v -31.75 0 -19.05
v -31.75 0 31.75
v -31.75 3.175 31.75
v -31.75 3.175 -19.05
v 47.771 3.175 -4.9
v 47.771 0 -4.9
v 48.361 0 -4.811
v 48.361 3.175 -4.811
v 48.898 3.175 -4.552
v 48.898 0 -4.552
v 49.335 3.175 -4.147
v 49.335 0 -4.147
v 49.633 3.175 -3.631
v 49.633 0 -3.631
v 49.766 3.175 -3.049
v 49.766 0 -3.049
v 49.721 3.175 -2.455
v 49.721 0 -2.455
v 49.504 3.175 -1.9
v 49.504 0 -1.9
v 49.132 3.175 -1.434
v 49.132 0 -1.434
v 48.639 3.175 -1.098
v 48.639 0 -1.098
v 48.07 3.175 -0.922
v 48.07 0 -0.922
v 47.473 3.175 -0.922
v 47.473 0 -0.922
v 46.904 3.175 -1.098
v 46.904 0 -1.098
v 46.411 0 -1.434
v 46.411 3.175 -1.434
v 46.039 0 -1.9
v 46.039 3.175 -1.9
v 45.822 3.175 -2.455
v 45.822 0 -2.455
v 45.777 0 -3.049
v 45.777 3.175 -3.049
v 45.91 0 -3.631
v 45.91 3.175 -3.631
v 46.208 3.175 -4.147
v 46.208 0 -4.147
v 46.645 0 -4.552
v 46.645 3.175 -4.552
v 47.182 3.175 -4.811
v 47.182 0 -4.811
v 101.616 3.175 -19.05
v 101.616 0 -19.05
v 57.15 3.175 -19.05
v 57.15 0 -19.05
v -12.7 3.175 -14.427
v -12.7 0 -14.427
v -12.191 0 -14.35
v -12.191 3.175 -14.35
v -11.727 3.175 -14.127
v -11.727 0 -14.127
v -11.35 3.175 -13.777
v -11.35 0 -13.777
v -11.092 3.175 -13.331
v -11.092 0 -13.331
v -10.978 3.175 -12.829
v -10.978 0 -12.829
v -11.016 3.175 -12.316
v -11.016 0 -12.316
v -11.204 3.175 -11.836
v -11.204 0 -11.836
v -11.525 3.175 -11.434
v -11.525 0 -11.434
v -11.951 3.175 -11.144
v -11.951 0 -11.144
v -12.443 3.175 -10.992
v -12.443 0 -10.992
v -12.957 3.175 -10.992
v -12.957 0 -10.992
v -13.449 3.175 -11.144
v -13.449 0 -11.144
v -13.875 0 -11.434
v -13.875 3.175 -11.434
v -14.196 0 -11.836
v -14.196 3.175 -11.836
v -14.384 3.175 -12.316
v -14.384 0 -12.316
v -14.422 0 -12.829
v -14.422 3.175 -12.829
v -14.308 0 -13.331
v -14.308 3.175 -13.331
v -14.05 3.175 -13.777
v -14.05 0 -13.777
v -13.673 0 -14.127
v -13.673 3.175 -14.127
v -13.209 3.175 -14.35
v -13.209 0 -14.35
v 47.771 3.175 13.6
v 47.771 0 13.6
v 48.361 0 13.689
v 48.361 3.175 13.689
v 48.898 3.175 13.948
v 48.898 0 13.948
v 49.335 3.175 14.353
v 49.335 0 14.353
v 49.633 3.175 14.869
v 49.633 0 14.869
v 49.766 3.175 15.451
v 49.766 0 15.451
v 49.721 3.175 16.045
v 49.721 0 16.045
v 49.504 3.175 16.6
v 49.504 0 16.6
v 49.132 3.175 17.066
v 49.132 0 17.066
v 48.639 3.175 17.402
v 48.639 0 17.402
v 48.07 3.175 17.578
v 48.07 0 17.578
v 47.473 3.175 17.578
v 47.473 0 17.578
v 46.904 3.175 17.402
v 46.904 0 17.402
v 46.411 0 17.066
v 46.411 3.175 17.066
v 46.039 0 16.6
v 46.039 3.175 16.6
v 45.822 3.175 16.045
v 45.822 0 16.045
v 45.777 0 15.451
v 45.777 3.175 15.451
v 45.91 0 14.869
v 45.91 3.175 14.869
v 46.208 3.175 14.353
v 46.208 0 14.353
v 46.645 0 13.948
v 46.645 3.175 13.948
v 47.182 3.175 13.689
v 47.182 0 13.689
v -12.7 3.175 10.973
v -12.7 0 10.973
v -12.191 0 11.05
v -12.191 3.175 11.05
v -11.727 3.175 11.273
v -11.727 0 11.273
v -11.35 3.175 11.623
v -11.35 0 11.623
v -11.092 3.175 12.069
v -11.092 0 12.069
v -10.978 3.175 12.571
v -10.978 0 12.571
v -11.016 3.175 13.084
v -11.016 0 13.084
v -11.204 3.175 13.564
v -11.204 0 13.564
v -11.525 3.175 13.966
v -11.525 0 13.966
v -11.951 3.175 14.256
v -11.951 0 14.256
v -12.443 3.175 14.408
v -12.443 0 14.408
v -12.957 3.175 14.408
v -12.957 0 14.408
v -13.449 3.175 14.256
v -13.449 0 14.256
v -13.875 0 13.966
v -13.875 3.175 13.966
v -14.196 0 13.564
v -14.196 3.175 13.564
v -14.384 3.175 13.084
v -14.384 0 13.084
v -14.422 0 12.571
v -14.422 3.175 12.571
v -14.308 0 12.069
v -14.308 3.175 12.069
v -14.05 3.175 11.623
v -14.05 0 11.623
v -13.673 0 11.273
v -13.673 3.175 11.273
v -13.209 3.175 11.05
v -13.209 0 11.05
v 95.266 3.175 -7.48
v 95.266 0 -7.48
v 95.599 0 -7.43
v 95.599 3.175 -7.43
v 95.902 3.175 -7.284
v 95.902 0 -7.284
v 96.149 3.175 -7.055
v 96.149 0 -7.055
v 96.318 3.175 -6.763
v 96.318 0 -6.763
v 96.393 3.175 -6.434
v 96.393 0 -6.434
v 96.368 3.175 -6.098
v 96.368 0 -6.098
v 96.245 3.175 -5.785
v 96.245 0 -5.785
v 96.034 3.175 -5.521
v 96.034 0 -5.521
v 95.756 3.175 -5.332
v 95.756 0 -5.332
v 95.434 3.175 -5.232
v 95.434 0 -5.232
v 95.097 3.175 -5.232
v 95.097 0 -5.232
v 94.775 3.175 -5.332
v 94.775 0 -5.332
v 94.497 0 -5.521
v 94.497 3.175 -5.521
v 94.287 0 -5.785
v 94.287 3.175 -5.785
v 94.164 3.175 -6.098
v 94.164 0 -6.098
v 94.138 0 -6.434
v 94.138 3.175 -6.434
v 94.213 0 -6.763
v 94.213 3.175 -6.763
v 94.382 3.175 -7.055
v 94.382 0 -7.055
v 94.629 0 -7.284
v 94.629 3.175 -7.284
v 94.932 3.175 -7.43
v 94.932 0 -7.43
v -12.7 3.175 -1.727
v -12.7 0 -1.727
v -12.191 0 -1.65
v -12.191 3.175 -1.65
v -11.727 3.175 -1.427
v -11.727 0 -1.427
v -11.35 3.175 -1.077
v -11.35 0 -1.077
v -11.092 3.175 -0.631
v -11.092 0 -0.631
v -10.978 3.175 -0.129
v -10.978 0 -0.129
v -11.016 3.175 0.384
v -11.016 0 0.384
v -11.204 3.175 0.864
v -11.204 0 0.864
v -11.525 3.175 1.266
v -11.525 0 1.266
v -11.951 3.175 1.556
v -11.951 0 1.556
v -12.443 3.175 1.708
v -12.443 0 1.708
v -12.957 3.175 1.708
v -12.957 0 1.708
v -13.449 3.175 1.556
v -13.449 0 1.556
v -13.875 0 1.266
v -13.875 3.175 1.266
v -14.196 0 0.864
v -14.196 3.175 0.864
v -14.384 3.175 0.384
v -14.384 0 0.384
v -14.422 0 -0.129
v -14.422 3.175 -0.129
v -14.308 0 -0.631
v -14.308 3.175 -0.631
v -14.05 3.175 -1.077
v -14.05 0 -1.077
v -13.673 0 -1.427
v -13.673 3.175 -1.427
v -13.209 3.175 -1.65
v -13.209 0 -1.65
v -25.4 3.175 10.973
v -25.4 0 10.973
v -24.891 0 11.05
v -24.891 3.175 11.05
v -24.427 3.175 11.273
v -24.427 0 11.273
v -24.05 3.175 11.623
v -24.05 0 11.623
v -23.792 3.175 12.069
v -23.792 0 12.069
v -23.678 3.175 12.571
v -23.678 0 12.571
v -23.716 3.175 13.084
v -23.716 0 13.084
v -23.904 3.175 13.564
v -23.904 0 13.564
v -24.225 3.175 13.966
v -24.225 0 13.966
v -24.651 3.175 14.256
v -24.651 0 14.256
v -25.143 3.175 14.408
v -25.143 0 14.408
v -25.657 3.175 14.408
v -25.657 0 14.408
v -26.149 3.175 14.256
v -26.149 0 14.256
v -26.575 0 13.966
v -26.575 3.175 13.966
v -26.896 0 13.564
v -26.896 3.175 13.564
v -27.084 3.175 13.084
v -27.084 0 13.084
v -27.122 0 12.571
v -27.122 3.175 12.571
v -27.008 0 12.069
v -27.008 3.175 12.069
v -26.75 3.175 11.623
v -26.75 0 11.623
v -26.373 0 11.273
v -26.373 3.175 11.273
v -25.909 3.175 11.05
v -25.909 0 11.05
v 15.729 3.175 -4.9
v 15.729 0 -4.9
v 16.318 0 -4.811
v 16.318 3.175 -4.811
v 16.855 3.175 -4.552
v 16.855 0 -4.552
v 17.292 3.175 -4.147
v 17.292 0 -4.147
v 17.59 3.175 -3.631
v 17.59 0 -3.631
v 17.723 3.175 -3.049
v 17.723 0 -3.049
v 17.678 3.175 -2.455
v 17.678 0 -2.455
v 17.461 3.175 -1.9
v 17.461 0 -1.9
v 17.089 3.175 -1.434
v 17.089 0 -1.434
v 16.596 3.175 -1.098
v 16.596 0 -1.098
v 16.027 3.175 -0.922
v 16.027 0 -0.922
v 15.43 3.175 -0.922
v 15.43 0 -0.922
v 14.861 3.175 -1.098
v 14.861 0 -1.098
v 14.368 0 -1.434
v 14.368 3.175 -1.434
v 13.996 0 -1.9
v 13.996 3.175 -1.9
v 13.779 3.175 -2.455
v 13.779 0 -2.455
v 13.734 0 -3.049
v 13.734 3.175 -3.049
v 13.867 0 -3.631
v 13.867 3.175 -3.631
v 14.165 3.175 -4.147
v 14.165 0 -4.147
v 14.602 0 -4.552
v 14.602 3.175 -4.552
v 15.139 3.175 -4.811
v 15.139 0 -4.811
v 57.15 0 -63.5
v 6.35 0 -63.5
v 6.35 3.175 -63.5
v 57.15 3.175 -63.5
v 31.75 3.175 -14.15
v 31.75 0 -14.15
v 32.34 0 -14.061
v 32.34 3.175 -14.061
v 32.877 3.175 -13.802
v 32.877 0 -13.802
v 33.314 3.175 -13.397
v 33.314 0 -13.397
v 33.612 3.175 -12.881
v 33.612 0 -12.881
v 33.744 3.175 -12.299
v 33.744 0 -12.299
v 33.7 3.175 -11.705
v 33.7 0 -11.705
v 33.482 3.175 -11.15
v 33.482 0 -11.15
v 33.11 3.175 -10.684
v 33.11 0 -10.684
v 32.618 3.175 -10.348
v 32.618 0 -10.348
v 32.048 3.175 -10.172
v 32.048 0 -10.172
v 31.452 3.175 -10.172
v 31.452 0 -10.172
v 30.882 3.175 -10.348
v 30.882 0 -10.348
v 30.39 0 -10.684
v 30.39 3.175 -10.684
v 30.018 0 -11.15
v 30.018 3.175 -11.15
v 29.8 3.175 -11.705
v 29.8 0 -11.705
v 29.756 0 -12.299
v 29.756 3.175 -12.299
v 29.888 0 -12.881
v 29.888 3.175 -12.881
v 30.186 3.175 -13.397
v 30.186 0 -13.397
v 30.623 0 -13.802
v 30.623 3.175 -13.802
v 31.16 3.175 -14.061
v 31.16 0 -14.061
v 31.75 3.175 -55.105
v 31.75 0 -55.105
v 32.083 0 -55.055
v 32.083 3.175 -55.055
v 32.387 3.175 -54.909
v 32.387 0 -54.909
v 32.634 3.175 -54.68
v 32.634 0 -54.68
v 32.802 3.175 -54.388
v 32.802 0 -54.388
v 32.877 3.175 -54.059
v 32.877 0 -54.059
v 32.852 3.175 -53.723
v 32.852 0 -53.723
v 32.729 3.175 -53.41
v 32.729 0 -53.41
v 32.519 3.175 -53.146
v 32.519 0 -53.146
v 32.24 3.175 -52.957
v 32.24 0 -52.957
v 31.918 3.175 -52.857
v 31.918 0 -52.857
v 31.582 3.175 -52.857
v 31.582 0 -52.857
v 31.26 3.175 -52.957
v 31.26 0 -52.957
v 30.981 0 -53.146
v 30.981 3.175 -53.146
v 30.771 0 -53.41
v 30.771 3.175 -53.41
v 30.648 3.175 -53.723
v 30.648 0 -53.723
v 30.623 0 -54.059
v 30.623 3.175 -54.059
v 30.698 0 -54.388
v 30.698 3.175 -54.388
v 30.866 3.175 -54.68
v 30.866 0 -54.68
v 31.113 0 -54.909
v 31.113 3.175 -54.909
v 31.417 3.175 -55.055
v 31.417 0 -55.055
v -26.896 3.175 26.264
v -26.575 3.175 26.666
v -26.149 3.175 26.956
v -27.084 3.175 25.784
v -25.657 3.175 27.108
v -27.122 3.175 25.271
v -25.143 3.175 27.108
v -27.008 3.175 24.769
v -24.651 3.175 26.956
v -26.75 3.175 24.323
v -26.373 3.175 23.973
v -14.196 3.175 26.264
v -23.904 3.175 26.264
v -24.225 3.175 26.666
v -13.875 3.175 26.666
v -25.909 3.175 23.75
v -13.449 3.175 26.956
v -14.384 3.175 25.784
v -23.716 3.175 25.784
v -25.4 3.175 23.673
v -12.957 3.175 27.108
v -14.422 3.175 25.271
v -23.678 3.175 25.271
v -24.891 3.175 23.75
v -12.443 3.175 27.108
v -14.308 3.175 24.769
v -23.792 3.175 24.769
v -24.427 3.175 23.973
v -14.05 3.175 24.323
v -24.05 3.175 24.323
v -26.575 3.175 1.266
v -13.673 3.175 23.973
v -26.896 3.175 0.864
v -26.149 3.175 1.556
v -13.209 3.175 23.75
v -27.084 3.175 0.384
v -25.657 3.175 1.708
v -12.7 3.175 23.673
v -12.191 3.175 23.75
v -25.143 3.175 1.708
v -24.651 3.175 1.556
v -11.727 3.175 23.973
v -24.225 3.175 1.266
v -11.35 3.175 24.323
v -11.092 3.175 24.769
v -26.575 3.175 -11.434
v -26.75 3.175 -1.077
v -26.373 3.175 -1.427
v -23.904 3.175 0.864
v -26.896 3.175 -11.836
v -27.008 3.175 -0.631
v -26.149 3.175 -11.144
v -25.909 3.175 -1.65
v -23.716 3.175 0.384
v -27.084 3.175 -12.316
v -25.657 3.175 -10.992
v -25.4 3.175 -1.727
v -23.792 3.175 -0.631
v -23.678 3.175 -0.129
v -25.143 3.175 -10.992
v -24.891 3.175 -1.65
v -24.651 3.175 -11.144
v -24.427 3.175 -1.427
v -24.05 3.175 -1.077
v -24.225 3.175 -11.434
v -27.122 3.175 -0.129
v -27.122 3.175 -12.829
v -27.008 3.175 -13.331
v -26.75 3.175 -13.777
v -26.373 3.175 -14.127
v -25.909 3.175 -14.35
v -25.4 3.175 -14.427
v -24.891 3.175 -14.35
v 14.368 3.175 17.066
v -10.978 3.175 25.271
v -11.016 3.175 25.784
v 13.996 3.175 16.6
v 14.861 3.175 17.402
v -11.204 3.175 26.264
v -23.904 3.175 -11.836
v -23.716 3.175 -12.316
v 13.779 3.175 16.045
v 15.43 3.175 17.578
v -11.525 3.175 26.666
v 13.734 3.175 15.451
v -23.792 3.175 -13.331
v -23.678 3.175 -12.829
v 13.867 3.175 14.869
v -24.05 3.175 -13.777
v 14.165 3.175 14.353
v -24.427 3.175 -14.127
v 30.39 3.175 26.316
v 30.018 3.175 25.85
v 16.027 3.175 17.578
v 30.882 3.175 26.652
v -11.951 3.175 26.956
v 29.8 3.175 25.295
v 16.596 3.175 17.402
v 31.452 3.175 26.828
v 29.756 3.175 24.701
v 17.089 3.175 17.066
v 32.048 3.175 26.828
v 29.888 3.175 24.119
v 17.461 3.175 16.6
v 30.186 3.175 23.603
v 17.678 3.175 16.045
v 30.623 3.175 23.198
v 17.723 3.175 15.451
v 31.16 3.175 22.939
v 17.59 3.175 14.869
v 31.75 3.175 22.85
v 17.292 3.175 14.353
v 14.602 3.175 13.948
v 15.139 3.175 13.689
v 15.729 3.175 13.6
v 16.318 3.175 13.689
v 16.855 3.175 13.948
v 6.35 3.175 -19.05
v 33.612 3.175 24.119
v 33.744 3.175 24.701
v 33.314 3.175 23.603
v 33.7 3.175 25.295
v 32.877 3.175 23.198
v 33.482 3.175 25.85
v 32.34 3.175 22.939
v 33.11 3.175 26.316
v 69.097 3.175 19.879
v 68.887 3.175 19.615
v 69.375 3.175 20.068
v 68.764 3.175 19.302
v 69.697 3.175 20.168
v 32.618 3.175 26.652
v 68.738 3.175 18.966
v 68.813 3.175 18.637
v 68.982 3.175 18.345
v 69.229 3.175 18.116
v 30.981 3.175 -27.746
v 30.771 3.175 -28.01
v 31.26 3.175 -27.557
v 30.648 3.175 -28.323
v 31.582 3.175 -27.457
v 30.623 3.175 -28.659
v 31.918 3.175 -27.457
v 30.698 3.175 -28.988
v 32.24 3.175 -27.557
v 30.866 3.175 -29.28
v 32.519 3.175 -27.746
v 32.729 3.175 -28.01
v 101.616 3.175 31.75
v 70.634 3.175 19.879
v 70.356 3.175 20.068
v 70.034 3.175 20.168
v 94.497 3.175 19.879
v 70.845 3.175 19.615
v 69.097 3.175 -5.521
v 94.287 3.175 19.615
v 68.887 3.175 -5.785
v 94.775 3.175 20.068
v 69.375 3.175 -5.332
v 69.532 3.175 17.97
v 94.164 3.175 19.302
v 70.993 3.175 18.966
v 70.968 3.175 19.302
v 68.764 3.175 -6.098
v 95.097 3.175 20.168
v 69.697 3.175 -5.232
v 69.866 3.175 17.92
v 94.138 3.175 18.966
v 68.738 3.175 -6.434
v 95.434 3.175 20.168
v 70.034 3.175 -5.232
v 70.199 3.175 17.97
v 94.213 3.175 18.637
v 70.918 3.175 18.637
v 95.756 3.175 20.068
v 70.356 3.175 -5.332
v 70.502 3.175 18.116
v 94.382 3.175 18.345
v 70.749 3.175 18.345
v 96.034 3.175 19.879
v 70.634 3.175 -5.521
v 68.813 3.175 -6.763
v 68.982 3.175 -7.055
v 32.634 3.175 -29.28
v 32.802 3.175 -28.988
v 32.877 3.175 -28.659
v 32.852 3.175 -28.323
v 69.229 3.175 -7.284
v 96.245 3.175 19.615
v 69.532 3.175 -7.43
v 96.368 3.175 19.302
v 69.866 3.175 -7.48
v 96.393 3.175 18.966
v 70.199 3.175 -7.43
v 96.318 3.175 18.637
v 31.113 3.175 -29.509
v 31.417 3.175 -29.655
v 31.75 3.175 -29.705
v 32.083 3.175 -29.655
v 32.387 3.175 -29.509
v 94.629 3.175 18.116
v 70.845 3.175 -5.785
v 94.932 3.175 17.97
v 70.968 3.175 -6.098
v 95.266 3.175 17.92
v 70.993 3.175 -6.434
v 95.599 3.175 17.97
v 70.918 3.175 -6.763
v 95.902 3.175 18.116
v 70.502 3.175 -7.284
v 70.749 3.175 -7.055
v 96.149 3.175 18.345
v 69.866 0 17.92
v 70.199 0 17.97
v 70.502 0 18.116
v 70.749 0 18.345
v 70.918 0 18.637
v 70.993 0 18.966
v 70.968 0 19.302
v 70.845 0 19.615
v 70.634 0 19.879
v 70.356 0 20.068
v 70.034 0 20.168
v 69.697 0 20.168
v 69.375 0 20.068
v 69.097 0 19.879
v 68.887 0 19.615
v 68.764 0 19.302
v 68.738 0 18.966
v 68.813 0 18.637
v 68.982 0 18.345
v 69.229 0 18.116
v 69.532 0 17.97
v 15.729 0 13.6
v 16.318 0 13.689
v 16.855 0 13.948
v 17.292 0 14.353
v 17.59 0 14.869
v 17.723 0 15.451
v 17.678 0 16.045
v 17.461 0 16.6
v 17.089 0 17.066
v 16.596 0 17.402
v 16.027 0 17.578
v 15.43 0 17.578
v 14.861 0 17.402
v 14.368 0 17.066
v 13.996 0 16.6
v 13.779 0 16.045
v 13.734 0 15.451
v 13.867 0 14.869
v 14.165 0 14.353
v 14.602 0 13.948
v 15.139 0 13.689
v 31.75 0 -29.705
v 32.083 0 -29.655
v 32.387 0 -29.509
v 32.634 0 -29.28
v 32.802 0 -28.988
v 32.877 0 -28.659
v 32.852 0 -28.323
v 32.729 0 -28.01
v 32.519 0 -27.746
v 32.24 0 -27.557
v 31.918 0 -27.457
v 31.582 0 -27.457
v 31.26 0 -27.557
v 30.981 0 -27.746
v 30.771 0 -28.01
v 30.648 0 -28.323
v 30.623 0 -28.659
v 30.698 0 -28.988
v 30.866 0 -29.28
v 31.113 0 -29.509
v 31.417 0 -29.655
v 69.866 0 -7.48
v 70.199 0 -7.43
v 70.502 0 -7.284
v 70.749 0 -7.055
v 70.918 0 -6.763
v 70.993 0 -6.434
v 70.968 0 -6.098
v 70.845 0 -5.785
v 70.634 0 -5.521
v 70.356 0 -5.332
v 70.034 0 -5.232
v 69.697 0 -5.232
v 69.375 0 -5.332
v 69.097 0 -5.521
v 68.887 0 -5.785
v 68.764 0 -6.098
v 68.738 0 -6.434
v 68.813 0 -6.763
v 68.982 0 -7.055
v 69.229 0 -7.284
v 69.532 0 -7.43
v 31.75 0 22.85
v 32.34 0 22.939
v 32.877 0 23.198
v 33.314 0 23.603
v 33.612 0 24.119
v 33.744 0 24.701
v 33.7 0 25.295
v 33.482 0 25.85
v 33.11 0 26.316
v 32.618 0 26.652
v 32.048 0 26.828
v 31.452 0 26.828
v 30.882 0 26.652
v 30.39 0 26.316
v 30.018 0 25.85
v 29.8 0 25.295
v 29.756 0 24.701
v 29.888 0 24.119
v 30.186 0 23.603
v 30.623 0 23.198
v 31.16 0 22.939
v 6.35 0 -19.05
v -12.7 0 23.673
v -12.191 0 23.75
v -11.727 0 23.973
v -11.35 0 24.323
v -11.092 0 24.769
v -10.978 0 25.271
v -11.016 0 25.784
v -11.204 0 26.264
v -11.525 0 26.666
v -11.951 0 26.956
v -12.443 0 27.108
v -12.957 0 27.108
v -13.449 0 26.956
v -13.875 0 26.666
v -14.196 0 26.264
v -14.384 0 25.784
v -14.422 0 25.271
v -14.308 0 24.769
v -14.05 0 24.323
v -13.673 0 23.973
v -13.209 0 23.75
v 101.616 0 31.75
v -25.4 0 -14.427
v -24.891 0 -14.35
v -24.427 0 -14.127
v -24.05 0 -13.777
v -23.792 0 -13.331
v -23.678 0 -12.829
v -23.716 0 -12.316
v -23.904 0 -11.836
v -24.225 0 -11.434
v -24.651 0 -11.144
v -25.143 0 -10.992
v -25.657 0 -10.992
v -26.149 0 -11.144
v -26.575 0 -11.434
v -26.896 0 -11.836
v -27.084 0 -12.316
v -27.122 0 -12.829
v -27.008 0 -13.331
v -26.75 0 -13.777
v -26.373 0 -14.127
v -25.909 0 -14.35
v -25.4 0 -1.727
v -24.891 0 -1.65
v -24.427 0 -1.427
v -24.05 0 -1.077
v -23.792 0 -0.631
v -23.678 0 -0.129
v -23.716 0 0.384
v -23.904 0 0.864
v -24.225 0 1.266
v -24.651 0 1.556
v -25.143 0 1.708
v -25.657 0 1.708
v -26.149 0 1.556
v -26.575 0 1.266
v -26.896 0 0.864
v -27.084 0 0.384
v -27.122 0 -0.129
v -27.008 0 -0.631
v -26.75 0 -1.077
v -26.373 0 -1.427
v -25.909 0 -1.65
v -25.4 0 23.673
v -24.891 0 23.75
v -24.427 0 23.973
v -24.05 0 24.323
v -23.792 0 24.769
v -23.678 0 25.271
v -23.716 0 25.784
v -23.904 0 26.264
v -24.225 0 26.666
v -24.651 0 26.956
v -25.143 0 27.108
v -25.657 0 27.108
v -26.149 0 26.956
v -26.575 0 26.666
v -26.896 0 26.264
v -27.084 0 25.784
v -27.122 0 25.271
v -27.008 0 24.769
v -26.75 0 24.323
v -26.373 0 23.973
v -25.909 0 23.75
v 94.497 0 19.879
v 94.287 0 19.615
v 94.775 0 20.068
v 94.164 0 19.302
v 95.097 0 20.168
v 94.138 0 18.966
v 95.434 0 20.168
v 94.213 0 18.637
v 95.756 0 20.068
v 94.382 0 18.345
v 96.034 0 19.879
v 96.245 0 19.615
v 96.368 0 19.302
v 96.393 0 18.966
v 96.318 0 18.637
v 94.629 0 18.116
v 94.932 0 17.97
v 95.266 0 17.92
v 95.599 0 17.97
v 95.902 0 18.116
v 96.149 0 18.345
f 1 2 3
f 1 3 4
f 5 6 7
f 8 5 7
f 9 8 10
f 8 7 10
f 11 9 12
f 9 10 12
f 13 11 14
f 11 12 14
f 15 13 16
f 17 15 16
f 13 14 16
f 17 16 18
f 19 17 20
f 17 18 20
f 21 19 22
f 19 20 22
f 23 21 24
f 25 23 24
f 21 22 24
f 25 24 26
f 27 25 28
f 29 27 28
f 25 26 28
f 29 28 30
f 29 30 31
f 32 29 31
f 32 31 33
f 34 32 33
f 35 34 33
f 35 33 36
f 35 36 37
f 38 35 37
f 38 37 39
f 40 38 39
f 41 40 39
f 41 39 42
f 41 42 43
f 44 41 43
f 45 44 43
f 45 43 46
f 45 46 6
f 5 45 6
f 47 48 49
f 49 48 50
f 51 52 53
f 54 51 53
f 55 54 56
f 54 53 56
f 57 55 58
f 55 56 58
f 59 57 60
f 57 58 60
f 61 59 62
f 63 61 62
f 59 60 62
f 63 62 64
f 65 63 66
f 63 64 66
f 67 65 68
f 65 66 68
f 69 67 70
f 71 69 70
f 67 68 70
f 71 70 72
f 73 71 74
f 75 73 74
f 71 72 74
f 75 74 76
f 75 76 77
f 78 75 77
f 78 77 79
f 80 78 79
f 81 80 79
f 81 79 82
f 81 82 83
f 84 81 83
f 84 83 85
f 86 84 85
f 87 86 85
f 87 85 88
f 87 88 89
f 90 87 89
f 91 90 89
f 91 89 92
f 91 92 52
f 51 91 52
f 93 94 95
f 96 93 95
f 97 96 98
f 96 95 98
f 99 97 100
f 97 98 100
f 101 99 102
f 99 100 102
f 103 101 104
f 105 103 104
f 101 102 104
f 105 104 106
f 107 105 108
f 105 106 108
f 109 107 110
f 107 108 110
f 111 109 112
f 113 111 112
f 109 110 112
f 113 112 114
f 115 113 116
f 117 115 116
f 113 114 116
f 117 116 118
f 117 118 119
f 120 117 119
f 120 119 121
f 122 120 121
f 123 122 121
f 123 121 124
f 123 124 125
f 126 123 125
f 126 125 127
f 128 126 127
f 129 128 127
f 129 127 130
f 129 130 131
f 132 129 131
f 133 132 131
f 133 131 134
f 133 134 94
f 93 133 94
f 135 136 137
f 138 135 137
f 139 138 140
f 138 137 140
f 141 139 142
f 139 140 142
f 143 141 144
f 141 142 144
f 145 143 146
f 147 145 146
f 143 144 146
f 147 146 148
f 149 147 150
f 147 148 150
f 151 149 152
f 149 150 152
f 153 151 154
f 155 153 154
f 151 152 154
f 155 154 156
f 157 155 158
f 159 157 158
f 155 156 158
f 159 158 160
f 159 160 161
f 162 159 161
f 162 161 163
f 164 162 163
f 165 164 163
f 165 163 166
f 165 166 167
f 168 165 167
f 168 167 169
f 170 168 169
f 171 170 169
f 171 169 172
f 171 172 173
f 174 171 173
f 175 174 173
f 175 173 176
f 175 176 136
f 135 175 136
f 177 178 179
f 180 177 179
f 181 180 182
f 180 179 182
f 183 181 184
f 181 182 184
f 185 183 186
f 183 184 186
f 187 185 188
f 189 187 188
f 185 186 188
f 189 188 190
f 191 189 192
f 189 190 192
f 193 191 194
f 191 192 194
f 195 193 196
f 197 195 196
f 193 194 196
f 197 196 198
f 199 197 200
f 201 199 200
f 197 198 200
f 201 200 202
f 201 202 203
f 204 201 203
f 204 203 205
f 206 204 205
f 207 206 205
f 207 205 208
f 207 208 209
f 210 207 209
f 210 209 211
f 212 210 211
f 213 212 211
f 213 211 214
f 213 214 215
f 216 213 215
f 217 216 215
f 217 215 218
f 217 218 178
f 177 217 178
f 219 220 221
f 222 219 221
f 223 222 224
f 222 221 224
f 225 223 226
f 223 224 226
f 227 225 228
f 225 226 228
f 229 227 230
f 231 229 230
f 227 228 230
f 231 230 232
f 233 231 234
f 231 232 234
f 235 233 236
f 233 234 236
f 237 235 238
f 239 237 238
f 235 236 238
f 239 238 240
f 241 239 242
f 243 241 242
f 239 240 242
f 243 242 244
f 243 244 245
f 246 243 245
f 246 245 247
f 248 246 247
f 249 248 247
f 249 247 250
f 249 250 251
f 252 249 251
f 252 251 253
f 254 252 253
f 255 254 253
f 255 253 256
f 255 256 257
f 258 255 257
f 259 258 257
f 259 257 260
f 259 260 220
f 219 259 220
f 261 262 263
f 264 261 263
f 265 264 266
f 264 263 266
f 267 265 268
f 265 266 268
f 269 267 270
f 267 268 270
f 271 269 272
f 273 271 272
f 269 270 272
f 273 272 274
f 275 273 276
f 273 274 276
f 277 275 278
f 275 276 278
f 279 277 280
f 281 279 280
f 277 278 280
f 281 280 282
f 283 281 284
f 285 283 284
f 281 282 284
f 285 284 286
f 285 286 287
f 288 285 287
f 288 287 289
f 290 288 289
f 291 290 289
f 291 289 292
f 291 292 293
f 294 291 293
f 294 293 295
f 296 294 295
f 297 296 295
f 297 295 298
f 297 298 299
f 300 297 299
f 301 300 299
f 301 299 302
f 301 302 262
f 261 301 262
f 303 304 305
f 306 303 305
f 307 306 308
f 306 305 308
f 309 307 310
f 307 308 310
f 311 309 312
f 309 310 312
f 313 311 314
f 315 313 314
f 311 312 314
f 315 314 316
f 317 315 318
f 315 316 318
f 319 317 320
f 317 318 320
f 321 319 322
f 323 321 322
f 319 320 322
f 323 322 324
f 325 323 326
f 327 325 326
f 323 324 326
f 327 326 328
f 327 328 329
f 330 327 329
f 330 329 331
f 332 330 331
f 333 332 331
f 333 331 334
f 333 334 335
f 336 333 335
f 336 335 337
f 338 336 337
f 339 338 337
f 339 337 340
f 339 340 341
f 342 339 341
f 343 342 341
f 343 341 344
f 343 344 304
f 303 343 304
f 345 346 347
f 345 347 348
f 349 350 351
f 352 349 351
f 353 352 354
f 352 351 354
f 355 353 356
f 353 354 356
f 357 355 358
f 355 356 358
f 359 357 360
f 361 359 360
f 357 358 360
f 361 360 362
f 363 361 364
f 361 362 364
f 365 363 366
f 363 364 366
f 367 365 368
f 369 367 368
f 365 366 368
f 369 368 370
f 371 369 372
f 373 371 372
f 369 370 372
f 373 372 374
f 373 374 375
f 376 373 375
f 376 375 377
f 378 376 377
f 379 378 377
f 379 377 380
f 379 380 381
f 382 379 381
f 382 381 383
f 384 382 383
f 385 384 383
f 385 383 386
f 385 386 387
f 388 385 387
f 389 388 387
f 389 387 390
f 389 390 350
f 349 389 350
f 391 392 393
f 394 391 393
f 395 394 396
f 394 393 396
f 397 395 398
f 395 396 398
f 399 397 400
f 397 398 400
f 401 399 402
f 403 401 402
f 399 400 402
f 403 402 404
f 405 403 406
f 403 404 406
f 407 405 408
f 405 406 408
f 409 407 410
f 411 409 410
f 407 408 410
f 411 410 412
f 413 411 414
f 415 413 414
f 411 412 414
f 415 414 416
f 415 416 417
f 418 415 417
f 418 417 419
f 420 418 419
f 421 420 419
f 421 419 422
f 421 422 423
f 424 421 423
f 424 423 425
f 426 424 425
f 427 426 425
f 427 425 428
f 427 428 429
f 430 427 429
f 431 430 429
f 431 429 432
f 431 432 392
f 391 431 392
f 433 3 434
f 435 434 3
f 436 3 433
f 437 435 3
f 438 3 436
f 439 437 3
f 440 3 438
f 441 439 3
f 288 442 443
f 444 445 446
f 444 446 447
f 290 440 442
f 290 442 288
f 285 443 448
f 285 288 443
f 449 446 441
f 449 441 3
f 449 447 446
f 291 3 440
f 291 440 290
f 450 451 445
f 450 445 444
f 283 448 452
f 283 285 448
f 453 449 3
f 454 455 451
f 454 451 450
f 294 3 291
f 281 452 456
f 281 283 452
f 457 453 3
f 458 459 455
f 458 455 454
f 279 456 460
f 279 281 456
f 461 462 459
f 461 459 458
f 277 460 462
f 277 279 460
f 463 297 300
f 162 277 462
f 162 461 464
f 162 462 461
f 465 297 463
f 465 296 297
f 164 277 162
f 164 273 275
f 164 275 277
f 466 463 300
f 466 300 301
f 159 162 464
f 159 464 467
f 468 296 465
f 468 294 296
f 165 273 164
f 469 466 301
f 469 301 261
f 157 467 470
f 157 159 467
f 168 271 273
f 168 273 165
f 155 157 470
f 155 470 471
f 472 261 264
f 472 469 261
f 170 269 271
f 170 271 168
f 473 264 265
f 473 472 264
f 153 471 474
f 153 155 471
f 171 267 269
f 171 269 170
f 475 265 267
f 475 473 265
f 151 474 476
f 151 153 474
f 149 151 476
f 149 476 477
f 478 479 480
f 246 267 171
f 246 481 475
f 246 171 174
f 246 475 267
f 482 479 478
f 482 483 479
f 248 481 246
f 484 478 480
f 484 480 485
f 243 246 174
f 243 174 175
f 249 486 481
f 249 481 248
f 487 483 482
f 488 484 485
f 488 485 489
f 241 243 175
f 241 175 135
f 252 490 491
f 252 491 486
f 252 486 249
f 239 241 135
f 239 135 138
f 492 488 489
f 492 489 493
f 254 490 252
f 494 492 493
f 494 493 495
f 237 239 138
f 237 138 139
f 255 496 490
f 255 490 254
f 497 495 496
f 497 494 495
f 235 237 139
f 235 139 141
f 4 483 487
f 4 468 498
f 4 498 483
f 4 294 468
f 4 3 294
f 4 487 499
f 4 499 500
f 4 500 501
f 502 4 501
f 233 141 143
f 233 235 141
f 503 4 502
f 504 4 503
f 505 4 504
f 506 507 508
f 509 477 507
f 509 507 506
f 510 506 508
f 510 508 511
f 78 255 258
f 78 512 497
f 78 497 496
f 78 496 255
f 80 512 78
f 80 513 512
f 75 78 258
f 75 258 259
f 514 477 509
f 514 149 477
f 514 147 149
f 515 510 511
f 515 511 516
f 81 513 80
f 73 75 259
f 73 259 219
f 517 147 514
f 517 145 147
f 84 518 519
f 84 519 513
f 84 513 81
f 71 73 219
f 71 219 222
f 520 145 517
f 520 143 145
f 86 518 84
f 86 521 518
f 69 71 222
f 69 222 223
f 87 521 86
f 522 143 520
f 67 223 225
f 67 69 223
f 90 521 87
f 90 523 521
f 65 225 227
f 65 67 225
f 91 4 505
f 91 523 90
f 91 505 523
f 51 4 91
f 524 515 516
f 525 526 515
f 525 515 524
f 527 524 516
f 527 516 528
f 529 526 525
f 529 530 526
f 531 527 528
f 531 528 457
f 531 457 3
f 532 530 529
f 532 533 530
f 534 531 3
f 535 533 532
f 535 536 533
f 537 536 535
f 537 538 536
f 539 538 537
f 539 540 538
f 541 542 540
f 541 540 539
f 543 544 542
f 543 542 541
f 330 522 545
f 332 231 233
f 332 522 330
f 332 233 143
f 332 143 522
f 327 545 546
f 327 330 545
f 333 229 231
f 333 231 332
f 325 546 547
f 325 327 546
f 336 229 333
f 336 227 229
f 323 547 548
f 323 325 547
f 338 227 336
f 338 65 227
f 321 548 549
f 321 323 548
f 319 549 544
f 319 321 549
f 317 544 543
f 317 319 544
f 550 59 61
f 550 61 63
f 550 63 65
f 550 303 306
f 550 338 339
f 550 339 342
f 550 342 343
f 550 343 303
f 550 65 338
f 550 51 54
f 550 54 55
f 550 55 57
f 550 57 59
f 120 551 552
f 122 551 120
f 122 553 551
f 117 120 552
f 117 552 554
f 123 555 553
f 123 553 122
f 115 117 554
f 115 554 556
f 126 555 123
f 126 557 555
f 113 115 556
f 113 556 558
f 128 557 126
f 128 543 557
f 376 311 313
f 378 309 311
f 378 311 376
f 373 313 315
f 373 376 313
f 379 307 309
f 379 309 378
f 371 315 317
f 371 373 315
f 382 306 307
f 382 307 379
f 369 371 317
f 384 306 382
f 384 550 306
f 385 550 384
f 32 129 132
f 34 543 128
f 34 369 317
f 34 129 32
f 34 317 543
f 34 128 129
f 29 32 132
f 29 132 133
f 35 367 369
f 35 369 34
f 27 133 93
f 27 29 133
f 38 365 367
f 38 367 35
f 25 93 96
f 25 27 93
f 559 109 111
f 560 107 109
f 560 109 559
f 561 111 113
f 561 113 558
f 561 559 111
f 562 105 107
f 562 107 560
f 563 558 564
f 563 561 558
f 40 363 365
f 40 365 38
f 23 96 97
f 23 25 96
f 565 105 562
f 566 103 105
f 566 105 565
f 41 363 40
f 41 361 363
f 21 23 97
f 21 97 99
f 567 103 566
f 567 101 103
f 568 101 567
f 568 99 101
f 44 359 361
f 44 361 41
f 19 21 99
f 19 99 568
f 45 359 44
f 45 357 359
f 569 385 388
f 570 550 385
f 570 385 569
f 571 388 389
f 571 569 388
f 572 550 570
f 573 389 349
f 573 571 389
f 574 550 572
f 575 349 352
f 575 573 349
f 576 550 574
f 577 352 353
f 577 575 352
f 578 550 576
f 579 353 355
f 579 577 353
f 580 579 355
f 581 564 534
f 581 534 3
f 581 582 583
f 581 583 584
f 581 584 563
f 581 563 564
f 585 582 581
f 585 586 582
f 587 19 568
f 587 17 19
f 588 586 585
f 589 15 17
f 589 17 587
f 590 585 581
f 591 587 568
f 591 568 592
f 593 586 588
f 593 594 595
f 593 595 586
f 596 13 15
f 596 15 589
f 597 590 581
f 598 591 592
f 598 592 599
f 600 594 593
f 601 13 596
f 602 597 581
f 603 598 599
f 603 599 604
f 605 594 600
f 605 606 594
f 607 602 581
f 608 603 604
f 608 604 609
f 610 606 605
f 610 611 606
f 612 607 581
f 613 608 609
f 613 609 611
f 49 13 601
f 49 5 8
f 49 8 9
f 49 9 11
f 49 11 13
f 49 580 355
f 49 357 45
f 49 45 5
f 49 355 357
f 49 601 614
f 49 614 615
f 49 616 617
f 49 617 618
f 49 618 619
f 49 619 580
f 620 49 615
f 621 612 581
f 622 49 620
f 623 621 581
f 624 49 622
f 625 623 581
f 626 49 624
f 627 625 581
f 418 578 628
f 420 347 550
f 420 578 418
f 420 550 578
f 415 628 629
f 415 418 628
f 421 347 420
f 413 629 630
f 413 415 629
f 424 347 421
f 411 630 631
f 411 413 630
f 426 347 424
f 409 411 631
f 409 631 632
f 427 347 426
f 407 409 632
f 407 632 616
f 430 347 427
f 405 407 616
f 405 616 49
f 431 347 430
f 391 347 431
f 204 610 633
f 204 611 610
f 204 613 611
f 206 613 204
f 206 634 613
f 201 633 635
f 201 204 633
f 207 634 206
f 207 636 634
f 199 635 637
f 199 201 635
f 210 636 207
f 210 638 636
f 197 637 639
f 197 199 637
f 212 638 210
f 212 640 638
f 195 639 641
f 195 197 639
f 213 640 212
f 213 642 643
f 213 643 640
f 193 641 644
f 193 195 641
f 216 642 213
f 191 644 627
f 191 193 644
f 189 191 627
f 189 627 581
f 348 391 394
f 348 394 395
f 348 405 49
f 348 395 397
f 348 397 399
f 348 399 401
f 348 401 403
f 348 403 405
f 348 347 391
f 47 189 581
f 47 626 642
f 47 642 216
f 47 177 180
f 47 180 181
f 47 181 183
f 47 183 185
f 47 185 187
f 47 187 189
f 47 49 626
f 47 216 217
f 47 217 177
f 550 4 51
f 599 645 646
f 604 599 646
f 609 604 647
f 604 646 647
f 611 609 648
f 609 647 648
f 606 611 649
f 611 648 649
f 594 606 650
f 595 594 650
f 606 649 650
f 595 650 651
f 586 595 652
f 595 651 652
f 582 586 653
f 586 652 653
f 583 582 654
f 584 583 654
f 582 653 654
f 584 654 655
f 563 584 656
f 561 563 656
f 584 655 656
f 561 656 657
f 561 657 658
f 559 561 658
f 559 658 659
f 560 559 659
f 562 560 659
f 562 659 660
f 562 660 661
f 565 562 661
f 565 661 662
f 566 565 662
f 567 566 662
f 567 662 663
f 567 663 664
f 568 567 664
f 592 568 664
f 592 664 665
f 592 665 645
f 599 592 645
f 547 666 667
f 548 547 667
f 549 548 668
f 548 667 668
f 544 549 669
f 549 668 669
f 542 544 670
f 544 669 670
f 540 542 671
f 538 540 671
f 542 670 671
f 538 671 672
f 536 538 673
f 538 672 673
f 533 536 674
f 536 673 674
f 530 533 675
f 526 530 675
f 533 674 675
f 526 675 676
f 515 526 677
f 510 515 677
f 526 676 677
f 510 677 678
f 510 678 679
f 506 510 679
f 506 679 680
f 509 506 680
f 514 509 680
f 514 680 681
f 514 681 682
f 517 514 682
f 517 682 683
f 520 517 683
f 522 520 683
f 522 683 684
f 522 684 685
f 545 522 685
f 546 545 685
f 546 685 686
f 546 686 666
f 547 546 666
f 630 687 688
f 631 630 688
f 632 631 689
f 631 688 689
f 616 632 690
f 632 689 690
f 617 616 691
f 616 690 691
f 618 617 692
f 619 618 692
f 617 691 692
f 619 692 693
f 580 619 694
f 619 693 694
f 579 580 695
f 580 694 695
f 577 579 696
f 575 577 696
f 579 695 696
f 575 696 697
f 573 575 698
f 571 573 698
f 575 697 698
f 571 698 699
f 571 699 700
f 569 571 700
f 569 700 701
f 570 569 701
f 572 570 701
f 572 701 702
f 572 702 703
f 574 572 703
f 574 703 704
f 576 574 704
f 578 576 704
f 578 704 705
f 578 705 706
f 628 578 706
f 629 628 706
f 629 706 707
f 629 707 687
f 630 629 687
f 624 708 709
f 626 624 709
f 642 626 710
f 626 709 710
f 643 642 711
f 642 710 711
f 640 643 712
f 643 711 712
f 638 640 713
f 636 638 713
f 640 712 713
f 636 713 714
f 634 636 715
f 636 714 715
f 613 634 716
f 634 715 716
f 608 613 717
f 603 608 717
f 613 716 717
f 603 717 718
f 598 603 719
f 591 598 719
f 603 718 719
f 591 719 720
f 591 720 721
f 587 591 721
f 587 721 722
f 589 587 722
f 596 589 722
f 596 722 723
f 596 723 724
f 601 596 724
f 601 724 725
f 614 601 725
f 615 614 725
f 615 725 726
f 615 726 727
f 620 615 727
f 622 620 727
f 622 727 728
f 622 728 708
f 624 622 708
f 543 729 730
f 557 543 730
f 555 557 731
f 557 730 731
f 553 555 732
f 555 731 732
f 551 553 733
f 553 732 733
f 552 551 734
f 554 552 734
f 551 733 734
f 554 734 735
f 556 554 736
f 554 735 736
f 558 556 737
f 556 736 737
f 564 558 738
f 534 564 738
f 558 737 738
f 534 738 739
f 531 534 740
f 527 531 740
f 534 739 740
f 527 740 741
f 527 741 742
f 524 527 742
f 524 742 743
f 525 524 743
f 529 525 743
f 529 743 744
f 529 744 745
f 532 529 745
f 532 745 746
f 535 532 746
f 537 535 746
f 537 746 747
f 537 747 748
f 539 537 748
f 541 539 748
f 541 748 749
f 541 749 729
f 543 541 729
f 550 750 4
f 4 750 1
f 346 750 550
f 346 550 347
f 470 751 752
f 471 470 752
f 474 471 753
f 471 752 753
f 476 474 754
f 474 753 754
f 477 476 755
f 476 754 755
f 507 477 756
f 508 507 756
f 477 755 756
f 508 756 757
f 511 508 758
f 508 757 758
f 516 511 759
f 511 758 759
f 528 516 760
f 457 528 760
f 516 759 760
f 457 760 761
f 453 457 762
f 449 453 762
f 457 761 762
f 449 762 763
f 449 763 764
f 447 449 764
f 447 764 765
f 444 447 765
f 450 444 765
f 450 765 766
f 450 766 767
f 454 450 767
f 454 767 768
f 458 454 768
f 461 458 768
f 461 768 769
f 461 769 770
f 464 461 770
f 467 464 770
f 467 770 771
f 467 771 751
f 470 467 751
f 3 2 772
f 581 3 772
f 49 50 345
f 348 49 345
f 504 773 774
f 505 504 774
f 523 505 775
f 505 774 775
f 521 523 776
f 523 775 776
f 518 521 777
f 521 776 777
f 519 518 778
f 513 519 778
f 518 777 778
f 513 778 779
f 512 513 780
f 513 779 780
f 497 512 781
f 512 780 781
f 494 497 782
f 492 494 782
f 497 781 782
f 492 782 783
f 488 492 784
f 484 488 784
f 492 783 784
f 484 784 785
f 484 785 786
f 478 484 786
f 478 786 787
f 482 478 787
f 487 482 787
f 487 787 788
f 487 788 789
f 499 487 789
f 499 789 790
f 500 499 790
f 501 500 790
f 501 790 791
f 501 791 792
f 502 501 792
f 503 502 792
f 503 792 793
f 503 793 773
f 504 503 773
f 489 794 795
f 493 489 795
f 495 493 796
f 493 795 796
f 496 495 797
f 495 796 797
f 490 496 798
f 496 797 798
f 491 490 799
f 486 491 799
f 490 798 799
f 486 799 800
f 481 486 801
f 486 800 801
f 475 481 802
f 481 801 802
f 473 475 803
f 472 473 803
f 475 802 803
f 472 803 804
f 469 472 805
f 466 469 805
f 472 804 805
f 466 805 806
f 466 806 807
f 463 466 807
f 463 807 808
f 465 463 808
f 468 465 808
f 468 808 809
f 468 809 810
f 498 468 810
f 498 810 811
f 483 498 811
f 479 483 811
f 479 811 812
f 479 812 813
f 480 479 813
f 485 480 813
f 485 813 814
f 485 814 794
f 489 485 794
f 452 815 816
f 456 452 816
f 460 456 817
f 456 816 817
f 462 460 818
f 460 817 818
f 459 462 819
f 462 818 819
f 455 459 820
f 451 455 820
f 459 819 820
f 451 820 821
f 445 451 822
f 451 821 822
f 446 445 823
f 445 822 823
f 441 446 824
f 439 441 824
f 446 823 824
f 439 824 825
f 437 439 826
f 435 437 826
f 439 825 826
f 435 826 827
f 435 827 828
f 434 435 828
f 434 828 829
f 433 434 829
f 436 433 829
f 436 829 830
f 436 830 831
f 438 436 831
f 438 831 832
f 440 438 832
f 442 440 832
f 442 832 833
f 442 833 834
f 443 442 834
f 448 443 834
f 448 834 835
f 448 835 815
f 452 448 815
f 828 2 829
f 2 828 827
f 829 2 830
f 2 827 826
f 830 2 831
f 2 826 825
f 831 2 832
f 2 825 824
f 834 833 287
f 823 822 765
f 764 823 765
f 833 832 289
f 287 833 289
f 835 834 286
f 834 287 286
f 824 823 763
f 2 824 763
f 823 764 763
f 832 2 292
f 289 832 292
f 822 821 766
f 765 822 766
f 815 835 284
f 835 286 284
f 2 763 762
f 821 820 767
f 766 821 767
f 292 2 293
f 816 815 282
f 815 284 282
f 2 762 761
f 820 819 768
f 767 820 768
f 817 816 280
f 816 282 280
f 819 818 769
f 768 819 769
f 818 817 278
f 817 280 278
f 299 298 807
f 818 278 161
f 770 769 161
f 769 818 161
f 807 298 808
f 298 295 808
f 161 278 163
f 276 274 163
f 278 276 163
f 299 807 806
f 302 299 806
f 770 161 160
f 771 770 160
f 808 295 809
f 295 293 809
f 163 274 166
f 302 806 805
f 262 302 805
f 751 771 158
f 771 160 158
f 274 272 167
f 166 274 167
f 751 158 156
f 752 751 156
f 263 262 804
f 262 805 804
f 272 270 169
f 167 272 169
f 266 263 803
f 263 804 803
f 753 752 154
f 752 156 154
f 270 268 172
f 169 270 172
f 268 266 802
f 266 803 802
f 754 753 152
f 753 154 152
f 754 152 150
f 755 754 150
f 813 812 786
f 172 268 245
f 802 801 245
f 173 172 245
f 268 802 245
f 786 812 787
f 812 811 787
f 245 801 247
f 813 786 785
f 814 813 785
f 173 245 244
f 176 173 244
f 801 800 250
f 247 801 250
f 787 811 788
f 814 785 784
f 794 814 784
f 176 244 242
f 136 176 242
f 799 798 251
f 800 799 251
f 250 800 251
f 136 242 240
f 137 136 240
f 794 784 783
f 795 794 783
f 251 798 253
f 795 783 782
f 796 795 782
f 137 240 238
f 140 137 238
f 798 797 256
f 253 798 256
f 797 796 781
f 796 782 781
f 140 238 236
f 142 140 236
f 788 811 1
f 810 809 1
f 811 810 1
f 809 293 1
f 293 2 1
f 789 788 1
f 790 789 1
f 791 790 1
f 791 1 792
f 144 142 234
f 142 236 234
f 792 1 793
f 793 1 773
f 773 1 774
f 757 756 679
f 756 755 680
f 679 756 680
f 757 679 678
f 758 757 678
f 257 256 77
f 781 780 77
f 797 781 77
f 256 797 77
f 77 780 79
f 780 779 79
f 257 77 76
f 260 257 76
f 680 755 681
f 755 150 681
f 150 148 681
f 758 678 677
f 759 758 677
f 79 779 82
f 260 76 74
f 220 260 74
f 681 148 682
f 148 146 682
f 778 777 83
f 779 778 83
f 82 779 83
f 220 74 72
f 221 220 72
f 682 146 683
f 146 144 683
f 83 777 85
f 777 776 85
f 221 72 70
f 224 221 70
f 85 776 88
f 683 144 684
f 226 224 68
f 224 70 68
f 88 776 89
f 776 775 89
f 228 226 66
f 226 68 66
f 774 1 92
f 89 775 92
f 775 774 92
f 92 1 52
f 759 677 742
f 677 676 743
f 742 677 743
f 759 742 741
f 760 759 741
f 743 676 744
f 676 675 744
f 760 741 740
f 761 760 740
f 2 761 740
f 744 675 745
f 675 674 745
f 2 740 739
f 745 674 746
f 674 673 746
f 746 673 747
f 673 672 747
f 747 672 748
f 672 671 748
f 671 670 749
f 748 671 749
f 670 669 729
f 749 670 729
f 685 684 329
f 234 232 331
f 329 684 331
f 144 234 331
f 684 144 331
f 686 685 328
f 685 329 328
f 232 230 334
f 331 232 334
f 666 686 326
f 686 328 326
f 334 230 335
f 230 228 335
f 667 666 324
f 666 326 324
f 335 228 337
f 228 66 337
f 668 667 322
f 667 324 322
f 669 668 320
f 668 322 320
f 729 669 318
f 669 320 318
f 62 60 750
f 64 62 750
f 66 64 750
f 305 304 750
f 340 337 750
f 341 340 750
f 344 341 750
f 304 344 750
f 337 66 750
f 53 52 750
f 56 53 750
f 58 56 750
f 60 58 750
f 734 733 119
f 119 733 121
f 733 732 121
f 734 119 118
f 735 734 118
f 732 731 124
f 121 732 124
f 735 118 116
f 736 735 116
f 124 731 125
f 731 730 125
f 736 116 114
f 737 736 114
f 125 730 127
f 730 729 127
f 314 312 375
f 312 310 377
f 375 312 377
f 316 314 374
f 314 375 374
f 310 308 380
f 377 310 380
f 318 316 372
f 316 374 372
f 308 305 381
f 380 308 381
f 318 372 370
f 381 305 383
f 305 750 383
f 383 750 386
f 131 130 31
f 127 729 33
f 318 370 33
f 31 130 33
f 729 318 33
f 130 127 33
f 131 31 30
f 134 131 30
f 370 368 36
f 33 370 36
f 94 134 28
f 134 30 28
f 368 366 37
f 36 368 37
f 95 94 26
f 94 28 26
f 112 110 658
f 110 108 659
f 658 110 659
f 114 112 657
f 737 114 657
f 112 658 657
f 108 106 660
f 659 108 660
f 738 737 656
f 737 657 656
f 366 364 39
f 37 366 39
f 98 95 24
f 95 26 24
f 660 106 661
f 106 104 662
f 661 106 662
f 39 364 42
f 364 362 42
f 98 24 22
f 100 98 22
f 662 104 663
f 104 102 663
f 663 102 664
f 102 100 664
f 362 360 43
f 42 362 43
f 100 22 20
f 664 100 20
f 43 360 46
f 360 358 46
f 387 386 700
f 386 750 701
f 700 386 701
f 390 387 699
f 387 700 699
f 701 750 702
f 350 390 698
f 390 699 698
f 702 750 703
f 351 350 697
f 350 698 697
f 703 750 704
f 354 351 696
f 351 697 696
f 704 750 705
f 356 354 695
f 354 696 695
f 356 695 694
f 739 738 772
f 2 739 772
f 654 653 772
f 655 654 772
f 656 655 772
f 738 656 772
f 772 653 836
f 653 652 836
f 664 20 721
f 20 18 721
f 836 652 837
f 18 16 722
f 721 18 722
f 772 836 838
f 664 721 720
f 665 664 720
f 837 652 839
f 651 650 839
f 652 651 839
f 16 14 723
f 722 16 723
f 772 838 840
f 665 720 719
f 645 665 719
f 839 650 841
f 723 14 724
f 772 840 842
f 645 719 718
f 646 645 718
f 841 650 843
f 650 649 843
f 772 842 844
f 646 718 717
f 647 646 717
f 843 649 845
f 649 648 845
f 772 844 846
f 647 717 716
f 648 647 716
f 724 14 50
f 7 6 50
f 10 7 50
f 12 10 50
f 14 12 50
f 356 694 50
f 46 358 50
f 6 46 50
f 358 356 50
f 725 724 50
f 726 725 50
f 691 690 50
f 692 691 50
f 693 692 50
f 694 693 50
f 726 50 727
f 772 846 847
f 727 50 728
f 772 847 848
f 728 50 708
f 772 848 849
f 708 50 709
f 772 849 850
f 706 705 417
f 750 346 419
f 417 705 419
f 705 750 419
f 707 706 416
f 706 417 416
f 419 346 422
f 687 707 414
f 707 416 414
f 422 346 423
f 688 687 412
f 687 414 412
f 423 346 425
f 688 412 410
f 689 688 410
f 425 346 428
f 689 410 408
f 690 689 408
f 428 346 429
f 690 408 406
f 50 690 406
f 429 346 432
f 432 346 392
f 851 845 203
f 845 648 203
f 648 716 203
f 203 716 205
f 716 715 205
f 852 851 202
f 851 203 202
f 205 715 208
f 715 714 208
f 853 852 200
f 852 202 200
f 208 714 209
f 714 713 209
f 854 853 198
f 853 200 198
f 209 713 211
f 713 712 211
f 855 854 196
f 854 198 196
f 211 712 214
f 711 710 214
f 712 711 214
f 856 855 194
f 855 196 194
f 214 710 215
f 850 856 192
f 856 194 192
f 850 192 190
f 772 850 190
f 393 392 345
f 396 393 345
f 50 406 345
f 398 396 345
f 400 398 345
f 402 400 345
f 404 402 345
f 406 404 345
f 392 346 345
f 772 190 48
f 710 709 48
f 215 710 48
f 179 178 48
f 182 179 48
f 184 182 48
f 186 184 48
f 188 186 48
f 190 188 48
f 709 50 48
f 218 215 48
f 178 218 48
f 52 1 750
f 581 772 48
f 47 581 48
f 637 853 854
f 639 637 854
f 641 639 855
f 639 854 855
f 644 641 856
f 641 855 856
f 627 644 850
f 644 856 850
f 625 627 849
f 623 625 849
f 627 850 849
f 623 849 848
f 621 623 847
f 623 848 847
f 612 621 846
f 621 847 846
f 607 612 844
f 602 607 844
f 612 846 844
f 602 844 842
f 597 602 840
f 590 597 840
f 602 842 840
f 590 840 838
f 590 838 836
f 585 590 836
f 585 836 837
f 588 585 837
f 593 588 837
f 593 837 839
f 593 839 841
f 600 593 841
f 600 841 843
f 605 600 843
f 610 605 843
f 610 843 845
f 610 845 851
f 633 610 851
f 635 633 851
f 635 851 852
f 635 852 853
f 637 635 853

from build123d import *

# Parameters (mm, degrees)
SKETCH1_W                 = 38.1
SKETCH1_H                 = 50.8
SKETCH1_W_2               = 50.8
SKETCH1_H_2               = 44.45
SKETCH1_W_3               = 6.365635467
BOSS_EXTRUDE1_DEPTH       = 3.175
TAP_DRILL_FOR_8_32_TAP1_D = 3.4544
F_4_0_4_DIAMETER_HOLE1_D  = 4
TAP_DRILL_FOR_4_40_TAP1_D = 2.2606
TAP_DRILL_FOR_4_40_TAP2_D = 2.2606


with BuildPart() as part:
    # Sketch1 → Boss-Extrude1 (new body)
    with BuildSketch(Plane(origin=(0, 0, 0), x_dir=(1, 0, 0), z_dir=(0, 1, 0))):
        with Locations((-12.7, -6.35)):
            Rectangle(SKETCH1_W, SKETCH1_H)
        with Locations((31.75, -6.35)):
            Rectangle(SKETCH1_W_2, SKETCH1_H)
        with Locations((31.75, 41.275)):
            Rectangle(SKETCH1_W_2, SKETCH1_H_2)
        with Locations((76.2, -6.35)):
            Rectangle(SKETCH1_W, SKETCH1_H)
        with Locations((98.432817734, -6.35)):
            Rectangle(SKETCH1_W_3, SKETCH1_H)
    extrude(amount=BOSS_EXTRUDE1_DEPTH)

    # Tap Drill for #8-32 Tap1 (through all)
    with Locations(Plane(origin=(-12.7, 3.175, 0), x_dir=(0, 0, 1), z_dir=(0, 1, 0))):
        with Locations((0, 0), (0, -12.7), (12.7, -12.7), (25.4, -12.7), (25.4, 0), (-12.7, 0), (-12.7, -12.7), (12.7, 0)):
            Hole(TAP_DRILL_FOR_8_32_TAP1_D / 2)

    # Ø4.0 (4) Diameter Hole1 (through all)
    with Locations(Plane(origin=(31.75, 3.175, -12.15), x_dir=(0, 0, 1), z_dir=(0, 1, 0))):
        with Locations((0, 0), (9.25, 16.02146997), (27.75, 16.02146997), (37, 0), (27.75, -16.02146997), (9.25, -16.02146997)):
            Hole(F_4_0_4_DIAMETER_HOLE1_D / 2)

    # Tap Drill for #4-40 Tap1 (through all)
    with Locations(Plane(origin=(69.865635467, 3.175, -6.35), x_dir=(0, 0, 1), z_dir=(0, 1, 0))):
        with Locations((0, 0), (0, 25.4), (25.4, 25.4), (25.4, 0)):
            Hole(TAP_DRILL_FOR_4_40_TAP1_D / 2)

    # Tap Drill for #4-40 Tap2 (through all)
    with Locations(Plane(origin=(31.75, 3.175, -53.975), x_dir=(0, 0, 1), z_dir=(0, 1, 0))):
        with Locations((0, 0), (25.4, 0)):
            Hole(TAP_DRILL_FOR_4_40_TAP2_D / 2)


solid = part.part
